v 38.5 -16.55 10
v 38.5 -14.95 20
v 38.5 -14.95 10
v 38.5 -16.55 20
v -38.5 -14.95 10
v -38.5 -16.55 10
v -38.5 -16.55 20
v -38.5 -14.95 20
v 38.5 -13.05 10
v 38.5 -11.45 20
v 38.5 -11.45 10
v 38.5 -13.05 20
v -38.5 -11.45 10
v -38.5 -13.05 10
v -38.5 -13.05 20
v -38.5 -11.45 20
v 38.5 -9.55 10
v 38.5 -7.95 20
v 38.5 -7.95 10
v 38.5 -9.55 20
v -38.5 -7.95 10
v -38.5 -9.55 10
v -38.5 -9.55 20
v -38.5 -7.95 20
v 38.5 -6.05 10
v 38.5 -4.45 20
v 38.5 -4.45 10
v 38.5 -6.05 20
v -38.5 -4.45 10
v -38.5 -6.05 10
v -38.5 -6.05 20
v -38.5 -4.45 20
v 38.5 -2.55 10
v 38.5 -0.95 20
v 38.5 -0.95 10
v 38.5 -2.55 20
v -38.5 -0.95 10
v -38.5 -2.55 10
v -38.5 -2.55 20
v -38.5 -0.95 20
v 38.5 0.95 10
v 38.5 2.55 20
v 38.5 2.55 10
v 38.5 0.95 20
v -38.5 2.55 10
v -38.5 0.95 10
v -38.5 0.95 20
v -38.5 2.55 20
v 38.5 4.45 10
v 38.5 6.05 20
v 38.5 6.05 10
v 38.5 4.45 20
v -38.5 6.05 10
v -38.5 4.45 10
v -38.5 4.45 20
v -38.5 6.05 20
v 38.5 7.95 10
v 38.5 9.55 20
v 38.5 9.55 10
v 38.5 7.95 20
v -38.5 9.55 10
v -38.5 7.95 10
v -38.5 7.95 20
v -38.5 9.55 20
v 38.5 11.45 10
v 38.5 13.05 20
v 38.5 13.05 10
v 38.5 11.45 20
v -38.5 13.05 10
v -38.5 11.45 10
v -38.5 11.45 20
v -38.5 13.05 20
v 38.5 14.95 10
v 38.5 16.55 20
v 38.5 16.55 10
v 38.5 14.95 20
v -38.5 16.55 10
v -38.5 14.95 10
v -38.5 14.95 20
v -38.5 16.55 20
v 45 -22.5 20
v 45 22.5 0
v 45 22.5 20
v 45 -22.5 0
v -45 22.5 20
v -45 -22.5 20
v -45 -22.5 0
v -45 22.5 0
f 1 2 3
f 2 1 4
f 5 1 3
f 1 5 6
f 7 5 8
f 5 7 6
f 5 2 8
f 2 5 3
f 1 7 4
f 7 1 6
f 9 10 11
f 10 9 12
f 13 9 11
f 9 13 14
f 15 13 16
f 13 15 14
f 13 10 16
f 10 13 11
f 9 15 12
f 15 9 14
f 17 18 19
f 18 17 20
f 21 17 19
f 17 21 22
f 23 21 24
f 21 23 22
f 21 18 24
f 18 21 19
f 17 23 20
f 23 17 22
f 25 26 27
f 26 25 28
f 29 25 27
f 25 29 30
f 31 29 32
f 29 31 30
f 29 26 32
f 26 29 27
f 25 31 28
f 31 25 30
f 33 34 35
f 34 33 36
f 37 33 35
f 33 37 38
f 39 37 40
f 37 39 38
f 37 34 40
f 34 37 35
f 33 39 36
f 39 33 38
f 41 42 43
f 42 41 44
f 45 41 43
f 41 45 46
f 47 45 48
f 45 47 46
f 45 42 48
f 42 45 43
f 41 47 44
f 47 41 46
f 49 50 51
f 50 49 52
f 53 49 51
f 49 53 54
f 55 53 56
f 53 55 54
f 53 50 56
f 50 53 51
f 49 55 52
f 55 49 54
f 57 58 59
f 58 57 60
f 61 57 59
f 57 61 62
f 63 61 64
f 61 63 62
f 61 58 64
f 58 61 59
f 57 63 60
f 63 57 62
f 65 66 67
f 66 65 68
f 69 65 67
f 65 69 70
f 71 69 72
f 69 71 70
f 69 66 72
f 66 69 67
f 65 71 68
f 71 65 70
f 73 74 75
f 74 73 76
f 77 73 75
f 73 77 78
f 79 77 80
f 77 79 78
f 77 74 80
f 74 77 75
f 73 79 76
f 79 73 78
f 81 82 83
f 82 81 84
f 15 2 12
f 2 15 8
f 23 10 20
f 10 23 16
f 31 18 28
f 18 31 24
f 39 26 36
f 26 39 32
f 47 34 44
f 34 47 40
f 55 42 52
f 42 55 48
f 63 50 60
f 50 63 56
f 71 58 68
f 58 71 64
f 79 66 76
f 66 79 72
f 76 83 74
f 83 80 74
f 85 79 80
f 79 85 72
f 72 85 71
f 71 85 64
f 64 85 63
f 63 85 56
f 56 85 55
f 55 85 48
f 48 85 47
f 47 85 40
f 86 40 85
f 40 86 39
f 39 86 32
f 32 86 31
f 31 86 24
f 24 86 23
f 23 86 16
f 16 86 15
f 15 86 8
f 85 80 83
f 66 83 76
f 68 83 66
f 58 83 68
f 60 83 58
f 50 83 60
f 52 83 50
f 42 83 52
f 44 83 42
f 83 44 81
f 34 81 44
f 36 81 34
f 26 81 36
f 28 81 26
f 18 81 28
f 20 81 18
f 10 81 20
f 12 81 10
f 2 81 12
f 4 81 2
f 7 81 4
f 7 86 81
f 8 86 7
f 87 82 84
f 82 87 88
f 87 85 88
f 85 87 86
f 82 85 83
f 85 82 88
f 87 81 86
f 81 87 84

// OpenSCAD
// Slide drying rack - holds 10 microscope slides standing upright on their long edge
// Print orientation: base block on the XY plane, slots open upward (+Z)

// ---------------- Parameters ----------------
block_len    = 90;    // base block length along X (mm)
block_wid    = 45;    // base block width along Y (mm)
block_ht     = 20;    // base block height along Z (mm)

slot_len     = 77;    // slot length along X (mm)
slot_w       = 1.6;   // slot width along Y (mm)
slot_depth   = 10;    // slot depth from top face (mm)
slot_pitch   = 3.5;   // centre-to-centre slot spacing along Y (mm)
slot_count   = 10;    // number of slots

eps          = 0.5;   // overshoot for clean boolean cuts (mm)

$fn = 64;

// ---------------- Model ----------------
difference() {
    // Solid base block, centred in X and Y, resting on z = 0
    translate([-block_len/2, -block_wid/2, 0])
        cube([block_len, block_wid, block_ht]);

    // Row of parallel slots, centred on the block in X and Y
    for (i = [0 : slot_count - 1]) {
        y_c = (i - (slot_count - 1)/2) * slot_pitch;
        translate([-slot_len/2, y_c - slot_w/2, block_ht - slot_depth])
            cube([slot_len, slot_w, slot_depth + eps]);
    }
}
